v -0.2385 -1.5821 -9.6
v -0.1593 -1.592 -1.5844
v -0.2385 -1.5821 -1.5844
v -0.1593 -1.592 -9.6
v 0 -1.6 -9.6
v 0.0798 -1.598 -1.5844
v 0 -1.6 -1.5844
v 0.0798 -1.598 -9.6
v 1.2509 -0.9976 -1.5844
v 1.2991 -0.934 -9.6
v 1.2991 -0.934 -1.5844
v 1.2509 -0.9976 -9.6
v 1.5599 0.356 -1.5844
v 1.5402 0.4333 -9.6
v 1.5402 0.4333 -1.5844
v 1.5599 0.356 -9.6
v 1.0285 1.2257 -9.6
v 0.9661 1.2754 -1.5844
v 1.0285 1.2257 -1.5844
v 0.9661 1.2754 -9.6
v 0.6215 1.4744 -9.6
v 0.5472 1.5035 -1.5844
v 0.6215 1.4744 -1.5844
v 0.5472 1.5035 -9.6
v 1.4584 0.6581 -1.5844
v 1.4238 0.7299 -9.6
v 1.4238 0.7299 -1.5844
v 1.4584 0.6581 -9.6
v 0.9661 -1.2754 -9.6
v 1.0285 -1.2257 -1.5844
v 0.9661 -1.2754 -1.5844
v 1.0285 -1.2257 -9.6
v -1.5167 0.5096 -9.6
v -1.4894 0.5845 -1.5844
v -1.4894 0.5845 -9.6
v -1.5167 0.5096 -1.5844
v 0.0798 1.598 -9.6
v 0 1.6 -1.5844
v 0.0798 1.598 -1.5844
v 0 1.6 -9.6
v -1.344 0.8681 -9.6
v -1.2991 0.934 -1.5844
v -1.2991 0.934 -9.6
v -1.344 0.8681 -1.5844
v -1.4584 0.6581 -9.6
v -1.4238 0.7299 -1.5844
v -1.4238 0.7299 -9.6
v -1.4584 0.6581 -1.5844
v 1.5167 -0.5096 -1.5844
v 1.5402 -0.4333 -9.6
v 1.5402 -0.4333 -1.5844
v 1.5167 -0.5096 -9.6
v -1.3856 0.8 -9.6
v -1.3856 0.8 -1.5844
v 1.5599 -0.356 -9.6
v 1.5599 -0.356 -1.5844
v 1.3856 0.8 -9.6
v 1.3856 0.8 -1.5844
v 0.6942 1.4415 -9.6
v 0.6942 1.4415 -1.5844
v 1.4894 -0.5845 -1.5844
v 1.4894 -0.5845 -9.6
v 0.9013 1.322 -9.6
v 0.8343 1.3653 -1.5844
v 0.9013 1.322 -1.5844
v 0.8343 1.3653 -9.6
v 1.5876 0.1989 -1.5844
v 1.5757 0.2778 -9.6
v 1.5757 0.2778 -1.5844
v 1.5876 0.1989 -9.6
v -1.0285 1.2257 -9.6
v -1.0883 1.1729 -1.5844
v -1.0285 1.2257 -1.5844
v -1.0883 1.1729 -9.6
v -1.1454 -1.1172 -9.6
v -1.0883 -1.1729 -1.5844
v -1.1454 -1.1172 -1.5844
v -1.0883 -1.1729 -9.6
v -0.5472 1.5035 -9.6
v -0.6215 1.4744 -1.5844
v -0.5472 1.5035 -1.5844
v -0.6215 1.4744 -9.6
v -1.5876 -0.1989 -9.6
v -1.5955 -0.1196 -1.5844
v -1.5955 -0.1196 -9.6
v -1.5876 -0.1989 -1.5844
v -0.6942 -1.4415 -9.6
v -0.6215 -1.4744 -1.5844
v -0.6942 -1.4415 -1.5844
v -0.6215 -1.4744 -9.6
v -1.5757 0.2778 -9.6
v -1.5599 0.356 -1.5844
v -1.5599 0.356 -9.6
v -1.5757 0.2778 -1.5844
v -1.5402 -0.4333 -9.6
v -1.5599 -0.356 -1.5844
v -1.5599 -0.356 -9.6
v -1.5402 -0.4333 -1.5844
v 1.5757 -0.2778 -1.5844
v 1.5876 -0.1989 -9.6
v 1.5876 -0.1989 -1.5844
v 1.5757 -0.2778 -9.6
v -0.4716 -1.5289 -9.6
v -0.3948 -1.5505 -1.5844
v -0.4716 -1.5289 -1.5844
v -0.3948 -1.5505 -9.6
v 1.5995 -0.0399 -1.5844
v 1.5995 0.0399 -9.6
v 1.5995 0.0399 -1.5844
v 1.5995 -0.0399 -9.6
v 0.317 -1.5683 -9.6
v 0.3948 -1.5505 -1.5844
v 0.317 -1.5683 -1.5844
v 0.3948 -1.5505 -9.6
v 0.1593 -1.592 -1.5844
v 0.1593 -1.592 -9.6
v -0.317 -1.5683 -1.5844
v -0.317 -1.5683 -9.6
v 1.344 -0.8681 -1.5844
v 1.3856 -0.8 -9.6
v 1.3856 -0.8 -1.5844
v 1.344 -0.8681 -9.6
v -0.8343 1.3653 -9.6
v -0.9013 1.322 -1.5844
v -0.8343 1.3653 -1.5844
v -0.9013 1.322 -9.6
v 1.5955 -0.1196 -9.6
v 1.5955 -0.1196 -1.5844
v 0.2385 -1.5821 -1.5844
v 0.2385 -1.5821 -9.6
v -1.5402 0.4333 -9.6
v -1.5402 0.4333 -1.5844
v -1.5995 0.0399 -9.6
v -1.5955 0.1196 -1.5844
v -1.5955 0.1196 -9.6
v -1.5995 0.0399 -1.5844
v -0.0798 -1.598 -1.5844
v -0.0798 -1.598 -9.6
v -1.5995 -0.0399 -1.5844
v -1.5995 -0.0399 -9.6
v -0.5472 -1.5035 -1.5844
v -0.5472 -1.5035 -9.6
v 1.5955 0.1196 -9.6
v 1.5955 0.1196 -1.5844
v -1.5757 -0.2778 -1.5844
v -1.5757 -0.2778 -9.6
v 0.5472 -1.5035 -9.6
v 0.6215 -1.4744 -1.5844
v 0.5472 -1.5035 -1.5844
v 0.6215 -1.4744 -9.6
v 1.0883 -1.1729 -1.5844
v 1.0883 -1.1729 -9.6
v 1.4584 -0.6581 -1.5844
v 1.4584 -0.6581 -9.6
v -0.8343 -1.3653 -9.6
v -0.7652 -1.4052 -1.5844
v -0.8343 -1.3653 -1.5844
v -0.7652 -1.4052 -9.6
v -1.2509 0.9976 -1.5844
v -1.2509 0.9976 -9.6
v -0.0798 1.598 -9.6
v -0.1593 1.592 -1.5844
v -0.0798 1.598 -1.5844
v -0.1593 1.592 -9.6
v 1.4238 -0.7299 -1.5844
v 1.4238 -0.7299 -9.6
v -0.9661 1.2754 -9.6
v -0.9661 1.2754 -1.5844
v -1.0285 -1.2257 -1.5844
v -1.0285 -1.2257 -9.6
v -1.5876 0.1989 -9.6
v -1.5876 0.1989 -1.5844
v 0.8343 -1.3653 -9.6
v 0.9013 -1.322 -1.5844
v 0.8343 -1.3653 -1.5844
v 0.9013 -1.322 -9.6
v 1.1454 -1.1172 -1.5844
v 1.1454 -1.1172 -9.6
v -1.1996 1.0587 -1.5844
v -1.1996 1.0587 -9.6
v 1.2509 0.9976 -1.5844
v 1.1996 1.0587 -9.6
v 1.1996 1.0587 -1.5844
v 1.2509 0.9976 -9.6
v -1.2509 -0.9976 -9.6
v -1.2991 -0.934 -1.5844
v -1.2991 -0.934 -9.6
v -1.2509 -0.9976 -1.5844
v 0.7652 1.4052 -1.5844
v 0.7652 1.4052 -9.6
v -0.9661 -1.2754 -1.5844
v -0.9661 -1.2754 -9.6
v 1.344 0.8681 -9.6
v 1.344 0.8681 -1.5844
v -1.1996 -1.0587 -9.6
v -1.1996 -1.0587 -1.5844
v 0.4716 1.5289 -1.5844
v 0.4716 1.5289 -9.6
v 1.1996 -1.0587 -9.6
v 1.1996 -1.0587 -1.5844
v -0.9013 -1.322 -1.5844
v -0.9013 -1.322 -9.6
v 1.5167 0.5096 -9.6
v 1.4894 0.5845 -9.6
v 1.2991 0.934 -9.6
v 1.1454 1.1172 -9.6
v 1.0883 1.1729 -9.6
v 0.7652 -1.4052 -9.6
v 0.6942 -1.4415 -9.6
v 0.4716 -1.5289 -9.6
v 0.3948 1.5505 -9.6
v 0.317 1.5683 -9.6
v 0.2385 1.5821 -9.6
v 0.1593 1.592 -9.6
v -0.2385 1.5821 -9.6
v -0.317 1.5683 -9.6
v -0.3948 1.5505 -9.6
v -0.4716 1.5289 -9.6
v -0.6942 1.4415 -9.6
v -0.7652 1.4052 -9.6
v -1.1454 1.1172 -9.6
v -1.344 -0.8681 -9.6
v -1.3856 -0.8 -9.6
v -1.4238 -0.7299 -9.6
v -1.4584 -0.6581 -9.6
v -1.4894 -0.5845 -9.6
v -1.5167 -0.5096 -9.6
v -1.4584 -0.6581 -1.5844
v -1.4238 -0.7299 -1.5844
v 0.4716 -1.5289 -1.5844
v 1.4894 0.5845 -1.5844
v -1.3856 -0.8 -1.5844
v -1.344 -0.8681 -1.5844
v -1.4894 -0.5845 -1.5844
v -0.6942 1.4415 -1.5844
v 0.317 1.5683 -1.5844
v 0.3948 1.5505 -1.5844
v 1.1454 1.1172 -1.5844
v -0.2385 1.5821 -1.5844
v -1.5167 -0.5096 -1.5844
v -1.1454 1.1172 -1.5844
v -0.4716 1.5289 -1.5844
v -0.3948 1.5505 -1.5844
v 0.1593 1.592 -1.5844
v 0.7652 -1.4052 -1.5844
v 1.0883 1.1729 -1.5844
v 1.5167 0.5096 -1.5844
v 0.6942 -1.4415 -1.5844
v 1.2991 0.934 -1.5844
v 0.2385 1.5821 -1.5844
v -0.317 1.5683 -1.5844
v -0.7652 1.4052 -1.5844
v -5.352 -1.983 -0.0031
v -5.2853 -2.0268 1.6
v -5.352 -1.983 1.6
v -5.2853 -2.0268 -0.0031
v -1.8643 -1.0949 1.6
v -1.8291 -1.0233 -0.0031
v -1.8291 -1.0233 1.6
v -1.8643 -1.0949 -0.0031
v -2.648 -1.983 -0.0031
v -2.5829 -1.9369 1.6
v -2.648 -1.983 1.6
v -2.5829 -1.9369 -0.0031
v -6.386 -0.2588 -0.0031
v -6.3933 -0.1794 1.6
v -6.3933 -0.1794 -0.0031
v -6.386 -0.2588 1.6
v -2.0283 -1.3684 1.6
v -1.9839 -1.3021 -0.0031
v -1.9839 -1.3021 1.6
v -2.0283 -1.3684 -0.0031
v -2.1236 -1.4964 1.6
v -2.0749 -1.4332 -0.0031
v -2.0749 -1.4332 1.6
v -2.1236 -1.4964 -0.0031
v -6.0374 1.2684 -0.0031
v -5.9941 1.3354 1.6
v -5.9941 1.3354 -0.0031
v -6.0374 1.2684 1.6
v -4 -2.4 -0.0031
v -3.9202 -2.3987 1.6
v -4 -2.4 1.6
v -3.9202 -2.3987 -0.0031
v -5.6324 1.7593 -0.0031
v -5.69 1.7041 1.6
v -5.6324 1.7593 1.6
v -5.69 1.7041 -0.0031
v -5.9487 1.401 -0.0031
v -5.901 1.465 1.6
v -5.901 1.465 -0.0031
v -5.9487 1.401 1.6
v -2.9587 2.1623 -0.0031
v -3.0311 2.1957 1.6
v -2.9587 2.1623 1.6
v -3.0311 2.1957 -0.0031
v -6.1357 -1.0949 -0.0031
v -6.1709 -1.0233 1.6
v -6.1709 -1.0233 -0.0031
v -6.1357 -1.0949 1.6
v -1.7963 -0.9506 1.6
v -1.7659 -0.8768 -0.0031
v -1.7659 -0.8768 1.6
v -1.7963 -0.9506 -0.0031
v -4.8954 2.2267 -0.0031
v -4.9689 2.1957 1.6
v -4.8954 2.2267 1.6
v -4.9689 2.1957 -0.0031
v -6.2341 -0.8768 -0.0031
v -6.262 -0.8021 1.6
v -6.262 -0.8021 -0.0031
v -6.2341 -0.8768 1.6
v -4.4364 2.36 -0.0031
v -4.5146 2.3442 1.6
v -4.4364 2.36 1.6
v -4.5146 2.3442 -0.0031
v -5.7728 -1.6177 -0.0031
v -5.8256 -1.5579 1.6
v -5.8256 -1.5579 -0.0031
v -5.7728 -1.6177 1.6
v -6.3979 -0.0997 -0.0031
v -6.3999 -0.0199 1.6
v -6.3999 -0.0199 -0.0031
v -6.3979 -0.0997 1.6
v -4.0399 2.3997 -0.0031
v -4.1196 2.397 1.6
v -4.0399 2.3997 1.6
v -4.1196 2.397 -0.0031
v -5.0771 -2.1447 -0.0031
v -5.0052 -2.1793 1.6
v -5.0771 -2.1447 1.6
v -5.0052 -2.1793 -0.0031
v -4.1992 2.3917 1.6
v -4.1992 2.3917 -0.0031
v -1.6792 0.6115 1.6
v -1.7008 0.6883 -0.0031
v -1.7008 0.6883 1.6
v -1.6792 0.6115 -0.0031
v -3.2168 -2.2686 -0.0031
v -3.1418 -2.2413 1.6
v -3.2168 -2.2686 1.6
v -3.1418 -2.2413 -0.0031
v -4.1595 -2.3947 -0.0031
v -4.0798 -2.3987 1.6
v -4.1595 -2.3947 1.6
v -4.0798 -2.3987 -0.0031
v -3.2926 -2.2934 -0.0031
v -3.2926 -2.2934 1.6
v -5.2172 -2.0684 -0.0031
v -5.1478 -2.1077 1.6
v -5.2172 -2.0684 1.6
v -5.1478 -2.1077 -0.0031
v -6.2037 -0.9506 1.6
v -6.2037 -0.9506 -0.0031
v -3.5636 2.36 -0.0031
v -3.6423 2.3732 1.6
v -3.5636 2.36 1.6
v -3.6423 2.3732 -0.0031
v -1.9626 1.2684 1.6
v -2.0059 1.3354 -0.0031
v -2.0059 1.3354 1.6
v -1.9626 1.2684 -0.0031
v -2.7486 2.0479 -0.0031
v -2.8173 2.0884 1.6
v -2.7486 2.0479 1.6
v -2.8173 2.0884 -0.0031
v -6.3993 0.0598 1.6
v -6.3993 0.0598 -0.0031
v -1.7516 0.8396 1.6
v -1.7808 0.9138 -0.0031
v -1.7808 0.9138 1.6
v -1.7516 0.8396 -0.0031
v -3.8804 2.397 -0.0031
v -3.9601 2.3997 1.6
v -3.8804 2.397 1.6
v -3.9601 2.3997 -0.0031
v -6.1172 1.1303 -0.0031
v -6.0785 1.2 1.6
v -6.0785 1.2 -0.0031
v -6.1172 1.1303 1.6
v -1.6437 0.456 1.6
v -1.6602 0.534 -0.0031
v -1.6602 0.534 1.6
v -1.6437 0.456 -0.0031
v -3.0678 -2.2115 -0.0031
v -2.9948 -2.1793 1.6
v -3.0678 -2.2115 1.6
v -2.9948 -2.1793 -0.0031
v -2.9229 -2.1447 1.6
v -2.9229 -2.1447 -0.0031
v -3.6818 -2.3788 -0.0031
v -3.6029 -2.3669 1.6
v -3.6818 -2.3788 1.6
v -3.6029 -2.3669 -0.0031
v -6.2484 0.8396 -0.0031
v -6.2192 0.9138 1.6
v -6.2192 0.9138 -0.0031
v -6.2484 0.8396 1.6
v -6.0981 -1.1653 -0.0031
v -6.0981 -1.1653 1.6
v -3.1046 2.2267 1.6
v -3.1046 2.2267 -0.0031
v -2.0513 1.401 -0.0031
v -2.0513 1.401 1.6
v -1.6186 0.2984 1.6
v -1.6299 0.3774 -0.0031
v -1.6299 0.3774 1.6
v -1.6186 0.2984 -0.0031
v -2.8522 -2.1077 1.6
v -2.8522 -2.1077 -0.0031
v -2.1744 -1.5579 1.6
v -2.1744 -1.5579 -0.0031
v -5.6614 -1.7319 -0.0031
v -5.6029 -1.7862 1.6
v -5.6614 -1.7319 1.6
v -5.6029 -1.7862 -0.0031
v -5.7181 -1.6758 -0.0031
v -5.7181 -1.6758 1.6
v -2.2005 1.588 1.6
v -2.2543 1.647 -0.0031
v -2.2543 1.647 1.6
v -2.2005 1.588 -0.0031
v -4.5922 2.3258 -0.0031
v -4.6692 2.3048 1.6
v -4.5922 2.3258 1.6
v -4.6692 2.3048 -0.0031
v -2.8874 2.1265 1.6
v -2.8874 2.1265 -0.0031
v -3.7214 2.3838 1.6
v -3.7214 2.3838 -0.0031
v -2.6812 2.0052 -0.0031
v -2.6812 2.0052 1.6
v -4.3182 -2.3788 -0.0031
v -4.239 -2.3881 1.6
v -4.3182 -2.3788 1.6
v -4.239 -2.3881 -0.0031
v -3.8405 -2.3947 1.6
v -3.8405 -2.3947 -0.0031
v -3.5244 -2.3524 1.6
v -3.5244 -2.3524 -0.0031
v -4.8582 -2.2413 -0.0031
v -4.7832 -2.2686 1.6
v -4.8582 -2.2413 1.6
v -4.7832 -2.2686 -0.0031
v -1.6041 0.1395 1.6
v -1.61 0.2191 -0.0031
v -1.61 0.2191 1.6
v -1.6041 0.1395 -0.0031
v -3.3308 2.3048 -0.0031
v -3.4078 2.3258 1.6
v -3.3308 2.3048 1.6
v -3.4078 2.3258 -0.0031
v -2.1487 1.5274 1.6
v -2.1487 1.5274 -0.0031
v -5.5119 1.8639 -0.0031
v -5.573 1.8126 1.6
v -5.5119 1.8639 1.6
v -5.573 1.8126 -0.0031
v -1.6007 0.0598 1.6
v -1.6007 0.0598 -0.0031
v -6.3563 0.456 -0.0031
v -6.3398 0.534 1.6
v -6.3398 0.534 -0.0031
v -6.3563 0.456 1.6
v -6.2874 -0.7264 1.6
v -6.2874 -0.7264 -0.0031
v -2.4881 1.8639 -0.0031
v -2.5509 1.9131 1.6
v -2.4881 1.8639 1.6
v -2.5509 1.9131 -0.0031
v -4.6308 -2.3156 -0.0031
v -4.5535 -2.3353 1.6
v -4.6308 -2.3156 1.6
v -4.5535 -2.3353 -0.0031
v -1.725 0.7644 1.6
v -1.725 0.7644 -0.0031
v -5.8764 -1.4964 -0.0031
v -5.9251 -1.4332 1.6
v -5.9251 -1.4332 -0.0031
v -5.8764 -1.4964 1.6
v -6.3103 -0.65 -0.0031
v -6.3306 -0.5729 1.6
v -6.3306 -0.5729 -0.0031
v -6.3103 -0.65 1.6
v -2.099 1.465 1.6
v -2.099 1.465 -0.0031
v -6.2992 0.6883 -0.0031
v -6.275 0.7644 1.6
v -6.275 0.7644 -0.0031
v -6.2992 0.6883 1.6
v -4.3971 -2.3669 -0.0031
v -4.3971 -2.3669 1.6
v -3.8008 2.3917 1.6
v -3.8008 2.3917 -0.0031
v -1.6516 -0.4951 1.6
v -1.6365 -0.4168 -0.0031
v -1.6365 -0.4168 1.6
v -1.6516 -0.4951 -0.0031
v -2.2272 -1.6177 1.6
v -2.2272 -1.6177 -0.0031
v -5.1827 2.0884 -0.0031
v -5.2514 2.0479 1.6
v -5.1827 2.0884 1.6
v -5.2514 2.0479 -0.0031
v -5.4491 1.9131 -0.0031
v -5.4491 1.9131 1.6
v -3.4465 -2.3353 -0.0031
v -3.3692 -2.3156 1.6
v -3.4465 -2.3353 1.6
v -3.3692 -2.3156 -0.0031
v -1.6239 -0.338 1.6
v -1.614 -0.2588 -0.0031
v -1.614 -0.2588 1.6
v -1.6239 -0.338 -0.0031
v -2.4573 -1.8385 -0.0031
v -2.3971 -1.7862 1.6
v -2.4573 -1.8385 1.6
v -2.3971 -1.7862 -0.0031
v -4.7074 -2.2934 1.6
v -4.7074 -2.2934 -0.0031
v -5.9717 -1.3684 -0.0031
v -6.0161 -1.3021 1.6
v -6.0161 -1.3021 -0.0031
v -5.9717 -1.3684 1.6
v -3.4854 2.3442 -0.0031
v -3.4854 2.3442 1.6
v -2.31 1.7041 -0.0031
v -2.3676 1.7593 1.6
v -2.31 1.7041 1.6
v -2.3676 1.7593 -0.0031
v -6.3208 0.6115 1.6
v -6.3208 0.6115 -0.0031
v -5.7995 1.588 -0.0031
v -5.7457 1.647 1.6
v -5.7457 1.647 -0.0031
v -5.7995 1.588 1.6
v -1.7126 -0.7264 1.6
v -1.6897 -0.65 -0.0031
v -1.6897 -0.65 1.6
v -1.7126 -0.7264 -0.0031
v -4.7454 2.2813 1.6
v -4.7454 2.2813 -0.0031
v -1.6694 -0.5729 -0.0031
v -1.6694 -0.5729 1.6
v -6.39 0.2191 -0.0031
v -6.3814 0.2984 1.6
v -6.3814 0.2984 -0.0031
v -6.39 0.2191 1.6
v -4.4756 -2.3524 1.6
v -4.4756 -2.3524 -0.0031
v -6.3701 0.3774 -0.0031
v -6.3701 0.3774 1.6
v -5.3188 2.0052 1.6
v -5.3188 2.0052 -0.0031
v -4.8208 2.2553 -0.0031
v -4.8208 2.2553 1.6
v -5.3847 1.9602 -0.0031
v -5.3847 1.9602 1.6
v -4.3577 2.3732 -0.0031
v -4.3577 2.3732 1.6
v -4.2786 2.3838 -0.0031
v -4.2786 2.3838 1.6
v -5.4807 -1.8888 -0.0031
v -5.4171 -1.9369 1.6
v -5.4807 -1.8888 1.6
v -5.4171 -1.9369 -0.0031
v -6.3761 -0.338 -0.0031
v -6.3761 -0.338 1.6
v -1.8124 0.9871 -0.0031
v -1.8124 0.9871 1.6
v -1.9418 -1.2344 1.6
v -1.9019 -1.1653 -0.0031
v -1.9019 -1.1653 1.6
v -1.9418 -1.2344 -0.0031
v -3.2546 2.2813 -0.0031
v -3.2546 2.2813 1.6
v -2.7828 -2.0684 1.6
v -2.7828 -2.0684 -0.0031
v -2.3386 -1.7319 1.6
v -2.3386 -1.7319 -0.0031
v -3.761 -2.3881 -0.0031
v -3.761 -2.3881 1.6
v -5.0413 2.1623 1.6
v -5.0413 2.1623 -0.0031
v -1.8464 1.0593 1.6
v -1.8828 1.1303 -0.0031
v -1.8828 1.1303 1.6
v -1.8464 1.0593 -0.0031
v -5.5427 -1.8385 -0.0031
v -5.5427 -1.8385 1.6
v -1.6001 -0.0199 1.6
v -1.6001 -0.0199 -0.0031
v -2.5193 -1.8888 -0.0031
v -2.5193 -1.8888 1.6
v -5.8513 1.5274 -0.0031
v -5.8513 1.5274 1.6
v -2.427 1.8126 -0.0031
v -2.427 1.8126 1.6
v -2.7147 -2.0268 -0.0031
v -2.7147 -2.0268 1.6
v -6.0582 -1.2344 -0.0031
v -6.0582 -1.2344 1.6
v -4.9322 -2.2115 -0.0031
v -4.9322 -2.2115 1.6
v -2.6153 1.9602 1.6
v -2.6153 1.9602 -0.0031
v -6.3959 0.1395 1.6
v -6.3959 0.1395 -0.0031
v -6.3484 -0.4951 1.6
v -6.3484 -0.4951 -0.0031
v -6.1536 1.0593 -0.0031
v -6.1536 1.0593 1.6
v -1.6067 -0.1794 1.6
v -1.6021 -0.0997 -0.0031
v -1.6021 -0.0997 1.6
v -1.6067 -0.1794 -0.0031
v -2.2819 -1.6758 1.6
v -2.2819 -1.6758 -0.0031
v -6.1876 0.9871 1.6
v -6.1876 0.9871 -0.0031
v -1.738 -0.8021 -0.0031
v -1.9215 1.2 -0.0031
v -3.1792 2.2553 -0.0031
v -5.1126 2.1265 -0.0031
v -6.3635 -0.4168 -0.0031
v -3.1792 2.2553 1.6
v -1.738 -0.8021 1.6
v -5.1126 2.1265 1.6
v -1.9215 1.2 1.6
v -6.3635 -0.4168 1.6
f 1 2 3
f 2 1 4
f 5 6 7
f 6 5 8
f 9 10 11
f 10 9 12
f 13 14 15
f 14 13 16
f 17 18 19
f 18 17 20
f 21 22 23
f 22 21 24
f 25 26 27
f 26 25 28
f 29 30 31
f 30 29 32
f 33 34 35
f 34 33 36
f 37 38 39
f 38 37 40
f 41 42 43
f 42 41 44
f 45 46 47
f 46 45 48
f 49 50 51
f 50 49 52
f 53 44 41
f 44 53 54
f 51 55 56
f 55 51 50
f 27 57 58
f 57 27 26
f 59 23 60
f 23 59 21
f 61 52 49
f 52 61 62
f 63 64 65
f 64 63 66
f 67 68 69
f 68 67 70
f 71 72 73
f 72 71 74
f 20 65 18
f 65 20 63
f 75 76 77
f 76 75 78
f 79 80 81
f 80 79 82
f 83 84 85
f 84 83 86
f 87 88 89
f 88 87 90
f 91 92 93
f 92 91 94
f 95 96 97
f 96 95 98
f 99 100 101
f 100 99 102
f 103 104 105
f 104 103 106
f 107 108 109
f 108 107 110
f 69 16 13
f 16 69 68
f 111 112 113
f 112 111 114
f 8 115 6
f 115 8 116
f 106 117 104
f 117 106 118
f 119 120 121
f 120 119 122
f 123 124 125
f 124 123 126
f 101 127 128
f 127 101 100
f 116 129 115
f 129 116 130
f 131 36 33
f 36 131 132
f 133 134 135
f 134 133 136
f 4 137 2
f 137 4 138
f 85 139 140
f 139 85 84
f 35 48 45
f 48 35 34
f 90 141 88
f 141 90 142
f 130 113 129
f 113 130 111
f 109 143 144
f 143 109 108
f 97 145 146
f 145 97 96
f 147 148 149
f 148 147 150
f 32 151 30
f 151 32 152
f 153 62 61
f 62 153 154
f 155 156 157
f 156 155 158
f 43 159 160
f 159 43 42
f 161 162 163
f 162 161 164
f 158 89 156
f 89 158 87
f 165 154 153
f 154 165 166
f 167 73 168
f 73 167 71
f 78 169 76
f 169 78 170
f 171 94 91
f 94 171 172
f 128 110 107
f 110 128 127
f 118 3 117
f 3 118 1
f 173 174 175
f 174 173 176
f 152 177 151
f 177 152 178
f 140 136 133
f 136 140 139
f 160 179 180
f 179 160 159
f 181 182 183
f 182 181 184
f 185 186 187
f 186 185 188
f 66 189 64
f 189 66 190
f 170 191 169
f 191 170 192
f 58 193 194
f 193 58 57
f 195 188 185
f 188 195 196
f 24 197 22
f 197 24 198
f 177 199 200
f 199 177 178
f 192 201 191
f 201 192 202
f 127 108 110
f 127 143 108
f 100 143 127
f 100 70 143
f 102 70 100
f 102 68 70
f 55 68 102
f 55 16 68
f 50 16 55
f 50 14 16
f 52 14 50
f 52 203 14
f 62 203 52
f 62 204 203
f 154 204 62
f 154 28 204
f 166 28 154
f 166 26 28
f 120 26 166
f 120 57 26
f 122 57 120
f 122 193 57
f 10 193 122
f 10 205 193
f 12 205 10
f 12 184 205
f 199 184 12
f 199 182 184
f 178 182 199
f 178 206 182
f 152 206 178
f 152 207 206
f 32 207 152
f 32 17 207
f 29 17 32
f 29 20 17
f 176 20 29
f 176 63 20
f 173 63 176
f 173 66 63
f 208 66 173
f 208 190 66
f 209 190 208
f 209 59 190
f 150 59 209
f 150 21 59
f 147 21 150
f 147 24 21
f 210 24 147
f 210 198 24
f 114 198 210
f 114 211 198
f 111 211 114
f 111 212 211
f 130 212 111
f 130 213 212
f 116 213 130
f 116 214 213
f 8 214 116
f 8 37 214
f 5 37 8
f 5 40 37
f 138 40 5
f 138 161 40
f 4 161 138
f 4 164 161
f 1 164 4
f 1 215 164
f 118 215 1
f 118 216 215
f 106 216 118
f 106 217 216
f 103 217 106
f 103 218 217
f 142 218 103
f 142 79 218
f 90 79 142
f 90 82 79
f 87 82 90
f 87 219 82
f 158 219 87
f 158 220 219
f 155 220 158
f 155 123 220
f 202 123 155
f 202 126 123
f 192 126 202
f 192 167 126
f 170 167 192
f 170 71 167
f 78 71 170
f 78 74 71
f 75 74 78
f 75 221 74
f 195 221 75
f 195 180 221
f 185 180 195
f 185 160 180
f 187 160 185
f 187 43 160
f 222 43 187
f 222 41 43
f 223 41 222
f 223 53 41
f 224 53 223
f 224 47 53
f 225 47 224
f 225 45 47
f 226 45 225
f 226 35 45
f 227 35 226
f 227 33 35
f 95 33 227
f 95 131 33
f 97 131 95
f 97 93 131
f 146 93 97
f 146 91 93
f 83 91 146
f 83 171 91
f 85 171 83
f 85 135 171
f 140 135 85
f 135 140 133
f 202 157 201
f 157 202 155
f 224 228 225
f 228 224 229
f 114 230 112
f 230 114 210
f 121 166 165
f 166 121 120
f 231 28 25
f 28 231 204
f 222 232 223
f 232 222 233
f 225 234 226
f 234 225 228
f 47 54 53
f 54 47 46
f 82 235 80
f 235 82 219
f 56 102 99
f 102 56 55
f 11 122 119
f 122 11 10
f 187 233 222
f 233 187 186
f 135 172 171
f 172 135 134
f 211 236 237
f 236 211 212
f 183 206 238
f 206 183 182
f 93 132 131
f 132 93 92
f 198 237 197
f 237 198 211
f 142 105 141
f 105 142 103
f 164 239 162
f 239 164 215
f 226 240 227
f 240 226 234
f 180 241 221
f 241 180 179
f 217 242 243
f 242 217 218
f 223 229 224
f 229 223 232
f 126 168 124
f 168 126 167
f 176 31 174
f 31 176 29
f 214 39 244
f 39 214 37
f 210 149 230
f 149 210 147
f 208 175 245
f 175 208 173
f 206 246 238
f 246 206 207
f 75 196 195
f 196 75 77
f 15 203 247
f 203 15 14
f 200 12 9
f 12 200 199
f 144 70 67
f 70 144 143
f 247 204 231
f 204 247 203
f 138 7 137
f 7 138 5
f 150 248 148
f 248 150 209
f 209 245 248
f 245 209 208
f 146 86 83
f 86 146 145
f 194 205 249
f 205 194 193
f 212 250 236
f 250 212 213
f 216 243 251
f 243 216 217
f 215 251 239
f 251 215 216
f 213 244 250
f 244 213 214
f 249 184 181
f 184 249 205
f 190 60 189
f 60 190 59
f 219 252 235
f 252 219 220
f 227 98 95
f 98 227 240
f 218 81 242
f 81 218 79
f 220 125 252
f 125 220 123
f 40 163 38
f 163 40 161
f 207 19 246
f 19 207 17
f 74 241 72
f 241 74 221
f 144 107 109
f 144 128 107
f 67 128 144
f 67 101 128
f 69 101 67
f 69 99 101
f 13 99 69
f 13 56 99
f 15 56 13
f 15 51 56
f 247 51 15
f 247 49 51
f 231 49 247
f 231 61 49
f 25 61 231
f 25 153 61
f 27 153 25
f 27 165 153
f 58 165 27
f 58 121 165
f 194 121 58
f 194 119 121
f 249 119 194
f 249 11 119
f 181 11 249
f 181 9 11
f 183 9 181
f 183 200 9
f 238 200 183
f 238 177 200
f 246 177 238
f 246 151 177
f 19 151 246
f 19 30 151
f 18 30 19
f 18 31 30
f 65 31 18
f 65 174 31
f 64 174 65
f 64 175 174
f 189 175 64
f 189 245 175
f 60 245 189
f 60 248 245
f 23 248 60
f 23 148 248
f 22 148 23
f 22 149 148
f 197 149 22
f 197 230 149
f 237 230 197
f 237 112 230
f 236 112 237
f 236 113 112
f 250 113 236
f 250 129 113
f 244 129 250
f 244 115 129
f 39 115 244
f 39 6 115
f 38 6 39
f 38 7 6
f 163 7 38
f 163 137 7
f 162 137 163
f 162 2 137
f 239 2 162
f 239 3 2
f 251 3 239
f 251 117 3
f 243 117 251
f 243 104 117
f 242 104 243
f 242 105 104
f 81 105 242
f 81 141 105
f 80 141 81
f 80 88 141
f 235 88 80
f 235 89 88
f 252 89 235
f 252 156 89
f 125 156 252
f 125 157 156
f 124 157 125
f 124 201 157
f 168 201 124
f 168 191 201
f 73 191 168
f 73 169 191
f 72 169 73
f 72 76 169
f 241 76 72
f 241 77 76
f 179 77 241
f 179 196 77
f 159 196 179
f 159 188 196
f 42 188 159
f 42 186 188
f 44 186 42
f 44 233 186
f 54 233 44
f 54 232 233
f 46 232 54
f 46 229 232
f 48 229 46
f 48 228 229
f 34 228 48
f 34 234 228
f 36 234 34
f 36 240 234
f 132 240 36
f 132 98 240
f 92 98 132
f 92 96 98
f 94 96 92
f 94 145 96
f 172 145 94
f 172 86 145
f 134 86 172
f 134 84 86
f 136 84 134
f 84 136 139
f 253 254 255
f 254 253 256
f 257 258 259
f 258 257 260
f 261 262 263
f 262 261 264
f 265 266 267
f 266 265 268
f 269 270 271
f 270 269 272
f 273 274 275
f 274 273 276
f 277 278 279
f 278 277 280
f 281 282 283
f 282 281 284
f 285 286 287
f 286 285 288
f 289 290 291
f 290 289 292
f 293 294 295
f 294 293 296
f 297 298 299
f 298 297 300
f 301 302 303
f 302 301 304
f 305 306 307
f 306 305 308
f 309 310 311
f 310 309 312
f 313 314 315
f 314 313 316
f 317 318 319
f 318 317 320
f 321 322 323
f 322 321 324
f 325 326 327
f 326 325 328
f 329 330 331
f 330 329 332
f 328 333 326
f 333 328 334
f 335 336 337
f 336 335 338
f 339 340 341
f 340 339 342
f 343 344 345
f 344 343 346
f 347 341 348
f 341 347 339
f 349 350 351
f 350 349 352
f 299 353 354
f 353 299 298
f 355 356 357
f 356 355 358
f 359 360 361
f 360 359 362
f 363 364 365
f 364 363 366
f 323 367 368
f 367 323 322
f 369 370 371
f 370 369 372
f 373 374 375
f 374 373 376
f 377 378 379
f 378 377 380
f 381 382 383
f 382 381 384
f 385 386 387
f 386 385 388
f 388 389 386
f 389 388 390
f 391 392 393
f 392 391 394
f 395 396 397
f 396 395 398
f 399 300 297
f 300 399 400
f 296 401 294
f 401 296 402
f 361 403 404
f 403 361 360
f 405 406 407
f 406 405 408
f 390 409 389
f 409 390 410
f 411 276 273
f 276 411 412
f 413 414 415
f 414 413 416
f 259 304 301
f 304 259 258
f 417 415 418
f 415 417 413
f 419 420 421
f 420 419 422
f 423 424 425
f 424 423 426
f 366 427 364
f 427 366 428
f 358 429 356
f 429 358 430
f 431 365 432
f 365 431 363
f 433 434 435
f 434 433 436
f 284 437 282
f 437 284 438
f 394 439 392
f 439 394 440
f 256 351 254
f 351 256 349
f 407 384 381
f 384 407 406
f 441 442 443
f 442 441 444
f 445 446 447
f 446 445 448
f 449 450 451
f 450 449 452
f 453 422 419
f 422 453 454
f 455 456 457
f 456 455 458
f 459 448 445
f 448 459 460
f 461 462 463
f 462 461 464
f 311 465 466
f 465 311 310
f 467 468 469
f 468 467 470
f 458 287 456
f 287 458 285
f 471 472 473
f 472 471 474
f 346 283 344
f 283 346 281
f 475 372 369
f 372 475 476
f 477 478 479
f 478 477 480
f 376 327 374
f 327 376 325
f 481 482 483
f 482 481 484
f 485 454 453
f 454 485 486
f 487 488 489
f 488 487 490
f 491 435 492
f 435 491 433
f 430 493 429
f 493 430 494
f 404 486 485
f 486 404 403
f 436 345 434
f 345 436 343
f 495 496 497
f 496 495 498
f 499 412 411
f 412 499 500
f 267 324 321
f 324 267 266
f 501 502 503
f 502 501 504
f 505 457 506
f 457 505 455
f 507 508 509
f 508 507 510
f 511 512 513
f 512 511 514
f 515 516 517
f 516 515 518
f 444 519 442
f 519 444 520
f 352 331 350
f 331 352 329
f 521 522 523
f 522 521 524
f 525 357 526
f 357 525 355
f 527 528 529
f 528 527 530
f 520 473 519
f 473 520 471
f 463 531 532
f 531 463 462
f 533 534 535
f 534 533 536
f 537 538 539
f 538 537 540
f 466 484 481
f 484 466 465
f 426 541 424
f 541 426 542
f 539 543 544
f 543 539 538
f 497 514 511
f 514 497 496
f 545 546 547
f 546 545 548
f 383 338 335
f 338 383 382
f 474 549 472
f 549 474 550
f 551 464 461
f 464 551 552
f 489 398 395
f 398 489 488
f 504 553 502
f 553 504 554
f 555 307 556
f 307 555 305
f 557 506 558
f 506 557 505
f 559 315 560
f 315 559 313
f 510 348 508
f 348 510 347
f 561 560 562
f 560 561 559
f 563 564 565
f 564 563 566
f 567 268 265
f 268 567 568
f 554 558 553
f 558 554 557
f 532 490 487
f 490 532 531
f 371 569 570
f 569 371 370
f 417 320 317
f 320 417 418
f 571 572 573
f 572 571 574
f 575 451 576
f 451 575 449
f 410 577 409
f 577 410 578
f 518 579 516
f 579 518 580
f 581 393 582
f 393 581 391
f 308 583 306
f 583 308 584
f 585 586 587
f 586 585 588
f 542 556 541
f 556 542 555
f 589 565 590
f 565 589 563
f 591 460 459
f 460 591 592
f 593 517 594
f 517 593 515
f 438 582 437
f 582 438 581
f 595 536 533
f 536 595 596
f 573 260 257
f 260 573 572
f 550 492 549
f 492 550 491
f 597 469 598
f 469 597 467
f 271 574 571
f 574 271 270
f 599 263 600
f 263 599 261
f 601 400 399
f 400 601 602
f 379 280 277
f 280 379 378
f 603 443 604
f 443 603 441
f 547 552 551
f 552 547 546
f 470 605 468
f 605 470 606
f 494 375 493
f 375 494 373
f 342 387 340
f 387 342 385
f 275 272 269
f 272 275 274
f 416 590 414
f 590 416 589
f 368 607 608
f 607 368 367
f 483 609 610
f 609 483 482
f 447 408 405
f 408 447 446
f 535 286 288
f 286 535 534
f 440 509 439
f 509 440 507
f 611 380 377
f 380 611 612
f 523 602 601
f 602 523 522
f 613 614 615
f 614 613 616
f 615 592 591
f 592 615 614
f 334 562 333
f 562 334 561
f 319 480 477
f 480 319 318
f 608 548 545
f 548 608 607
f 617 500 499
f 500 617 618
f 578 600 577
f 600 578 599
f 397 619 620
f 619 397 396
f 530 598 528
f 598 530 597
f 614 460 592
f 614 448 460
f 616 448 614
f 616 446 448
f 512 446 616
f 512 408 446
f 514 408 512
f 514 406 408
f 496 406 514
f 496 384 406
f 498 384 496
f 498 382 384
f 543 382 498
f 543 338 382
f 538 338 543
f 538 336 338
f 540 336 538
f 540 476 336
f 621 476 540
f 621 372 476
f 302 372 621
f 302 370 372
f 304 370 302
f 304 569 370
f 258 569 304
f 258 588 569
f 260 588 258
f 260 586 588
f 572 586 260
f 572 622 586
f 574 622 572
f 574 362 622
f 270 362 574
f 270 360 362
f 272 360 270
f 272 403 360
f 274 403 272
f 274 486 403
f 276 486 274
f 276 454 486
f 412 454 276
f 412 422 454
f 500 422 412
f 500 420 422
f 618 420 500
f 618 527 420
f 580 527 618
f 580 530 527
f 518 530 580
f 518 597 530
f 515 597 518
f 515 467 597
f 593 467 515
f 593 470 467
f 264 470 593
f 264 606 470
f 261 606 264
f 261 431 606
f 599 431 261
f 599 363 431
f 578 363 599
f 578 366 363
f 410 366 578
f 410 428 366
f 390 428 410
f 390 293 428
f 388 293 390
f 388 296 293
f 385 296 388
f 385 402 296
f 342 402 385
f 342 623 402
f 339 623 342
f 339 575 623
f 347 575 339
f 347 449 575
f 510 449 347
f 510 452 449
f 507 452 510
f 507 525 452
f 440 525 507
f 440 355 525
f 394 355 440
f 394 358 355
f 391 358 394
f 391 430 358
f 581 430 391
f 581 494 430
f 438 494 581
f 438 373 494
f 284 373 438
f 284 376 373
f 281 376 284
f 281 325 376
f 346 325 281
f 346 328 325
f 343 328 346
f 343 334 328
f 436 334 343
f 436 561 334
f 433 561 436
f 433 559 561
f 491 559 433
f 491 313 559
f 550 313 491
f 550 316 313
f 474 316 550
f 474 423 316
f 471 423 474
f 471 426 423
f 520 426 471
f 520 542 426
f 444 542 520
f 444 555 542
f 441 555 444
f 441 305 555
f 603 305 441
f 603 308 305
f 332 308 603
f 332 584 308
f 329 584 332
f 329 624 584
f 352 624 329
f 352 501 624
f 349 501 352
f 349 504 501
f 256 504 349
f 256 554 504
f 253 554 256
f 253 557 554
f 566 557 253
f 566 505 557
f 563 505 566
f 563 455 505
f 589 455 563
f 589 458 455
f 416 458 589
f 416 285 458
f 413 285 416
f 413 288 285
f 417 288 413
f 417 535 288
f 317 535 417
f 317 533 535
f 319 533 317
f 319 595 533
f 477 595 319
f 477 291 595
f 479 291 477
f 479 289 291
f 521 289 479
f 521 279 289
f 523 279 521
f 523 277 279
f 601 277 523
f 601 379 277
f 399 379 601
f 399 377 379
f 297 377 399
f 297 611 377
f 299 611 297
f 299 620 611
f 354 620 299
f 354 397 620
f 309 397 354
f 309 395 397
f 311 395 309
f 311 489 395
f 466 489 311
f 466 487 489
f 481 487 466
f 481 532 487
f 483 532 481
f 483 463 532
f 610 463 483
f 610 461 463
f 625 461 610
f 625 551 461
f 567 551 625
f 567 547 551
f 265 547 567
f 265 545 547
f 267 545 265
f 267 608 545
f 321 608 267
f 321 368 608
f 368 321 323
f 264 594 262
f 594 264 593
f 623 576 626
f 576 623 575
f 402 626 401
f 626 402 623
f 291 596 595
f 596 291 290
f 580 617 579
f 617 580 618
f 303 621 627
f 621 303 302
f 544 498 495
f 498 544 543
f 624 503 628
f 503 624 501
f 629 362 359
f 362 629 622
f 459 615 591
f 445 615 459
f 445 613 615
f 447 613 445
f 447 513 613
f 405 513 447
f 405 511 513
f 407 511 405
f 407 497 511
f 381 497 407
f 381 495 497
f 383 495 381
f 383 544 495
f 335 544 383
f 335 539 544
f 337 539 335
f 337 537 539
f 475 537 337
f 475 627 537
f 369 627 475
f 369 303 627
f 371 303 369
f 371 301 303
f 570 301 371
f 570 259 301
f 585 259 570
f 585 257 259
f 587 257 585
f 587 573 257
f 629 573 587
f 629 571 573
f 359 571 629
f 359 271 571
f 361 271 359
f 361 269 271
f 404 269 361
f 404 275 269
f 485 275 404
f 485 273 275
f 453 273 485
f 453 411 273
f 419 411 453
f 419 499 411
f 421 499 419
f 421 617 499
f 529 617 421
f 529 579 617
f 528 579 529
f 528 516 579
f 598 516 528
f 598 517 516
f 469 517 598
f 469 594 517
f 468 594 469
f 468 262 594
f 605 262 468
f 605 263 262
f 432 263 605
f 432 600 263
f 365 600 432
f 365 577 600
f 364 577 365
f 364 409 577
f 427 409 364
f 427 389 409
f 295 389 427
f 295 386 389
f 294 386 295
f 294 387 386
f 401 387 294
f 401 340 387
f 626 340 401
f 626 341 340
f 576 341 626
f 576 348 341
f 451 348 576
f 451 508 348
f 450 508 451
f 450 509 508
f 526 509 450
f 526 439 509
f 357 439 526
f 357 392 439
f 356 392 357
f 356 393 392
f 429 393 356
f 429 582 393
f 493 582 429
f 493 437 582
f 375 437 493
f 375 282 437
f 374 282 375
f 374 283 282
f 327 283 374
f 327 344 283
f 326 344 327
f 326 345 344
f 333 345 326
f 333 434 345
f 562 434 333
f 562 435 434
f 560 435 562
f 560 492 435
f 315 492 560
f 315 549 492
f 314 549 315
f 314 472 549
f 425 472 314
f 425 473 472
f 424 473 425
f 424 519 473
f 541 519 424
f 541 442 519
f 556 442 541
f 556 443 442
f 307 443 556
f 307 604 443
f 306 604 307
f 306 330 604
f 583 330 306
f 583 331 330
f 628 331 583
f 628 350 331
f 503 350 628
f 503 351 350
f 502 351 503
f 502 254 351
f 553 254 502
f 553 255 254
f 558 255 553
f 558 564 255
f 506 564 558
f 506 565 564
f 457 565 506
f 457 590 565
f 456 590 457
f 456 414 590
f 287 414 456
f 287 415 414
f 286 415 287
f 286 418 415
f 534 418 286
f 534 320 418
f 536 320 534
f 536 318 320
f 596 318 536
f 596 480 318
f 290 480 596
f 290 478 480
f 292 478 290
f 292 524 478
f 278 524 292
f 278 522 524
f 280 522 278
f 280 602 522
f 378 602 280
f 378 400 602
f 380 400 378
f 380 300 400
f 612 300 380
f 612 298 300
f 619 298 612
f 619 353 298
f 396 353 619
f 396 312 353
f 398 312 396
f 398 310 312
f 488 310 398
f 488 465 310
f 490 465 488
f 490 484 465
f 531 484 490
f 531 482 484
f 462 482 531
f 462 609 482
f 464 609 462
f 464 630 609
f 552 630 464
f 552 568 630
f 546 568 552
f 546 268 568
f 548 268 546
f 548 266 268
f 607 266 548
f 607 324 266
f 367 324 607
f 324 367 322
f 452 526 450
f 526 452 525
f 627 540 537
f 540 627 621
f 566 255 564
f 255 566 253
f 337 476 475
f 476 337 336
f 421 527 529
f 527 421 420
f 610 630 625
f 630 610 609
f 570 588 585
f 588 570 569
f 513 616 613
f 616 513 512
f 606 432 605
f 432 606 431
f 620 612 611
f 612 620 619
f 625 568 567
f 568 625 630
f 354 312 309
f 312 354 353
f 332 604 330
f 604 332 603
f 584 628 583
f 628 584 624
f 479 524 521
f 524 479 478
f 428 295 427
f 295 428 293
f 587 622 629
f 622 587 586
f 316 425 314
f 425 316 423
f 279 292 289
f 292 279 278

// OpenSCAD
use <../lib.scad>
use <76385.scad>
$fa=1; $fs=0.2;
function ldraw_lib__989(realsolid=false) = [
// 0 ~Moved to 76385
// 0 Name: 989.dat
// 0 Author: [PTadmin]
// 0 !LDRAW_ORG Part UPDATE 2010-02
// 0 !LICENSE Licensed under CC BY 4.0 : see CAreadme.txt
// 
// 0 BFC CERTIFY CCW
  [0,"BFC","CERTIFY"],
  [0,"BFC","CCW"],
// 
// 0 !HISTORY 2010-07-05 [PTadmin] Official Update 2010-02
// 
// 
// 0 // Hinge Brick 1 x 2 Locking with Single Finger On Top
// 1 16 0 0 0 1 0 0 0 1 0 0 0 1 76385.dat
  [1,16,0,0,0,1,0,0,0,1,0,0,0,1, ldraw_lib__76385(realsolid)],
];
module ldraw_lib__989(step=0, col=false, unit=2/5, alt=false, line=0.2, solid=!$preview)
    makepoly(ldraw_lib__989(solid), step=step, col=col, unit=unit, alt=alt, line=line, solid=solid);
ldraw_lib__989(line=0.2);
